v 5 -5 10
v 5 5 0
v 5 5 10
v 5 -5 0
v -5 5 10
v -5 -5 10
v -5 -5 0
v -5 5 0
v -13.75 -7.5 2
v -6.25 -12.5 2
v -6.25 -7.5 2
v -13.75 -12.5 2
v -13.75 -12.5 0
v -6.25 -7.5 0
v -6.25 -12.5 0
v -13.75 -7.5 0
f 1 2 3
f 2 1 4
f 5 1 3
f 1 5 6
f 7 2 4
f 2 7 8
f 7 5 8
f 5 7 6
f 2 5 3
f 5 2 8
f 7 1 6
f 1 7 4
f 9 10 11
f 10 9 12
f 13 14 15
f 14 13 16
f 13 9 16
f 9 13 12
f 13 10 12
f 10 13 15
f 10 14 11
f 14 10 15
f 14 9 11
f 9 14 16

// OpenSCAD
translate([0, 0, 5]) color([0,1,0,0.9]) cube([10, 10, 10], center=true);
translate([-13.5, -12.25, 1]) color([1,0,0]) cube([0.5, 0.5, 2], center=true);
translate([-13.0, -12.25, 1]) color([1,0,0]) cube([0.5, 0.5, 2], center=true);
translate([-12.5, -12.25, 1]) color([1,0,0]) cube([0.5, 0.5, 2], center=true);
translate([-12.0, -12.25, 1]) color([1,0,0]) cube([0.5, 0.5, 2], center=true);
translate([-11.5, -12.25, 1]) color([1,0,0]) cube([0.5, 0.5, 2], center=true);
translate([-11.0, -12.25, 1]) color([1,0,0]) cube([0.5, 0.5, 2], center=true);
translate([-10.5, -12.25, 1]) color([1,0,0]) cube([0.5, 0.5, 2], center=true);
translate([-10.0, -12.25, 1]) color([1,0,0]) cube([0.5, 0.5, 2], center=true);
translate([-9.5, -12.25, 1]) color([1,0,0]) cube([0.5, 0.5, 2], center=true);
translate([-9.0, -12.25, 1]) color([1,0,0]) cube([0.5, 0.5, 2], center=true);
translate([-8.5, -12.25, 1]) color([1,0,0]) cube([0.5, 0.5, 2], center=true);
translate([-8.0, -12.25, 1]) color([1,0,0]) cube([0.5, 0.5, 2], center=true);
translate([-7.5, -12.25, 1]) color([1,0,0]) cube([0.5, 0.5, 2], center=true);
translate([-7.0, -12.25, 1]) color([1,0,0]) cube([0.5, 0.5, 2], center=true);
translate([-6.5, -12.25, 1]) color([1,0,0]) cube([0.5, 0.5, 2], center=true);
translate([-13.5, -11.75, 1]) color([1,0,0]) cube([0.5, 0.5, 2], center=true);
translate([-13.0, -11.75, 1]) color([1,0,0]) cube([0.5, 0.5, 2], center=true);
translate([-12.5, -11.75, 1]) color([1,0,0]) cube([0.5, 0.5, 2], center=true);
translate([-12.0, -11.75, 1]) color([1,0,0]) cube([0.5, 0.5, 2], center=true);
translate([-11.5, -11.75, 1]) color([1,0,0]) cube([0.5, 0.5, 2], center=true);
translate([-11.0, -11.75, 1]) color([1,0,0]) cube([0.5, 0.5, 2], center=true);
translate([-10.5, -11.75, 1]) color([1,0,0]) cube([0.5, 0.5, 2], center=true);
translate([-10.0, -11.75, 1]) color([1,0,0]) cube([0.5, 0.5, 2], center=true);
translate([-9.5, -11.75, 1]) color([1,0,0]) cube([0.5, 0.5, 2], center=true);
translate([-9.0, -11.75, 1]) color([1,0,0]) cube([0.5, 0.5, 2], center=true);
translate([-8.5, -11.75, 1]) color([1,0,0]) cube([0.5, 0.5, 2], center=true);
translate([-8.0, -11.75, 1]) color([1,0,0]) cube([0.5, 0.5, 2], center=true);
translate([-7.5, -11.75, 1]) color([1,0,0]) cube([0.5, 0.5, 2], center=true);
translate([-7.0, -11.75, 1]) color([1,0,0]) cube([0.5, 0.5, 2], center=true);
translate([-6.5, -11.75, 1]) color([1,0,0]) cube([0.5, 0.5, 2], center=true);
translate([-13.5, -11.25, 1]) color([1,0,0]) cube([0.5, 0.5, 2], center=true);
translate([-13.0, -11.25, 1]) color([1,0,0]) cube([0.5, 0.5, 2], center=true);
translate([-12.5, -11.25, 1]) color([1,0,0]) cube([0.5, 0.5, 2], center=true);
translate([-12.0, -11.25, 1]) color([1,0,0]) cube([0.5, 0.5, 2], center=true);
translate([-11.5, -11.25, 1]) color([1,0,0]) cube([0.5, 0.5, 2], center=true);
translate([-11.0, -11.25, 1]) color([1,0,0]) cube([0.5, 0.5, 2], center=true);
translate([-10.5, -11.25, 1]) color([1,0,0]) cube([0.5, 0.5, 2], center=true);
translate([-10.0, -11.25, 1]) color([1,0,0]) cube([0.5, 0.5, 2], center=true);
translate([-9.5, -11.25, 1]) color([1,0,0]) cube([0.5, 0.5, 2], center=true);
translate([-9.0, -11.25, 1]) color([1,0,0]) cube([0.5, 0.5, 2], center=true);
translate([-8.5, -11.25, 1]) color([1,0,0]) cube([0.5, 0.5, 2], center=true);
translate([-8.0, -11.25, 1]) color([1,0,0]) cube([0.5, 0.5, 2], center=true);
translate([-7.5, -11.25, 1]) color([1,0,0]) cube([0.5, 0.5, 2], center=true);
translate([-7.0, -11.25, 1]) color([1,0,0]) cube([0.5, 0.5, 2], center=true);
translate([-6.5, -11.25, 1]) color([1,0,0]) cube([0.5, 0.5, 2], center=true);
translate([-13.5, -10.75, 1]) color([1,0,0]) cube([0.5, 0.5, 2], center=true);
translate([-13.0, -10.75, 1]) color([1,0,0]) cube([0.5, 0.5, 2], center=true);
translate([-12.5, -10.75, 1]) color([1,0,0]) cube([0.5, 0.5, 2], center=true);
translate([-12.0, -10.75, 1]) color([1,0,0]) cube([0.5, 0.5, 2], center=true);
translate([-11.5, -10.75, 1]) color([1,0,0]) cube([0.5, 0.5, 2], center=true);
translate([-11.0, -10.75, 1]) color([1,0,0]) cube([0.5, 0.5, 2], center=true);
translate([-10.5, -10.75, 1]) color([1,0,0]) cube([0.5, 0.5, 2], center=true);
translate([-10.0, -10.75, 1]) color([1,0,0]) cube([0.5, 0.5, 2], center=true);
translate([-9.5, -10.75, 1]) color([1,0,0]) cube([0.5, 0.5, 2], center=true);
translate([-9.0, -10.75, 1]) color([1,0,0]) cube([0.5, 0.5, 2], center=true);
translate([-8.5, -10.75, 1]) color([1,0,0]) cube([0.5, 0.5, 2], center=true);
translate([-8.0, -10.75, 1]) color([1,0,0]) cube([0.5, 0.5, 2], center=true);
translate([-7.5, -10.75, 1]) color([1,0,0]) cube([0.5, 0.5, 2], center=true);
translate([-7.0, -10.75, 1]) color([1,0,0]) cube([0.5, 0.5, 2], center=true);
translate([-6.5, -10.75, 1]) color([1,0,0]) cube([0.5, 0.5, 2], center=true);
translate([-13.5, -10.25, 1]) color([1,0,0]) cube([0.5, 0.5, 2], center=true);
translate([-13.0, -10.25, 1]) color([1,0,0]) cube([0.5, 0.5, 2], center=true);
translate([-12.5, -10.25, 1]) color([1,0,0]) cube([0.5, 0.5, 2], center=true);
translate([-12.0, -10.25, 1]) color([1,0,0]) cube([0.5, 0.5, 2], center=true);
translate([-11.5, -10.25, 1]) color([1,0,0]) cube([0.5, 0.5, 2], center=true);
translate([-11.0, -10.25, 1]) color([1,0,0]) cube([0.5, 0.5, 2], center=true);
translate([-10.5, -10.25, 1]) color([1,0,0]) cube([0.5, 0.5, 2], center=true);
translate([-10.0, -10.25, 1]) color([1,0,0]) cube([0.5, 0.5, 2], center=true);
translate([-9.5, -10.25, 1]) color([1,0,0]) cube([0.5, 0.5, 2], center=true);
translate([-9.0, -10.25, 1]) color([1,0,0]) cube([0.5, 0.5, 2], center=true);
translate([-8.5, -10.25, 1]) color([1,0,0]) cube([0.5, 0.5, 2], center=true);
translate([-8.0, -10.25, 1]) color([1,0,0]) cube([0.5, 0.5, 2], center=true);
translate([-7.5, -10.25, 1]) color([1,0,0]) cube([0.5, 0.5, 2], center=true);
translate([-7.0, -10.25, 1]) color([1,0,0]) cube([0.5, 0.5, 2], center=true);
translate([-6.5, -10.25, 1]) color([1,0,0]) cube([0.5, 0.5, 2], center=true);
translate([-13.5, -9.75, 1]) color([1,0,0]) cube([0.5, 0.5, 2], center=true);
translate([-13.0, -9.75, 1]) color([1,0,0]) cube([0.5, 0.5, 2], center=true);
translate([-12.5, -9.75, 1]) color([1,0,0]) cube([0.5, 0.5, 2], center=true);
translate([-12.0, -9.75, 1]) color([1,0,0]) cube([0.5, 0.5, 2], center=true);
translate([-11.5, -9.75, 1]) color([1,0,0]) cube([0.5, 0.5, 2], center=true);
translate([-11.0, -9.75, 1]) color([1,0,0]) cube([0.5, 0.5, 2], center=true);
translate([-10.5, -9.75, 1]) color([1,0,0]) cube([0.5, 0.5, 2], center=true);
translate([-10.0, -9.75, 1]) color([1,0,0]) cube([0.5, 0.5, 2], center=true);
translate([-9.5, -9.75, 1]) color([1,0,0]) cube([0.5, 0.5, 2], center=true);
translate([-9.0, -9.75, 1]) color([1,0,0]) cube([0.5, 0.5, 2], center=true);
translate([-8.5, -9.75, 1]) color([1,0,0]) cube([0.5, 0.5, 2], center=true);
translate([-8.0, -9.75, 1]) color([1,0,0]) cube([0.5, 0.5, 2], center=true);
translate([-7.5, -9.75, 1]) color([1,0,0]) cube([0.5, 0.5, 2], center=true);
translate([-7.0, -9.75, 1]) color([1,0,0]) cube([0.5, 0.5, 2], center=true);
translate([-6.5, -9.75, 1]) color([1,0,0]) cube([0.5, 0.5, 2], center=true);
translate([-13.5, -9.25, 1]) color([1,0,0]) cube([0.5, 0.5, 2], center=true);
translate([-13.0, -9.25, 1]) color([1,0,0]) cube([0.5, 0.5, 2], center=true);
translate([-12.5, -9.25, 1]) color([1,0,0]) cube([0.5, 0.5, 2], center=true);
translate([-12.0, -9.25, 1]) color([1,0,0]) cube([0.5, 0.5, 2], center=true);
translate([-11.5, -9.25, 1]) color([1,0,0]) cube([0.5, 0.5, 2], center=true);
translate([-11.0, -9.25, 1]) color([1,0,0]) cube([0.5, 0.5, 2], center=true);
translate([-10.5, -9.25, 1]) color([1,0,0]) cube([0.5, 0.5, 2], center=true);
translate([-10.0, -9.25, 1]) color([1,0,0]) cube([0.5, 0.5, 2], center=true);
translate([-9.5, -9.25, 1]) color([1,0,0]) cube([0.5, 0.5, 2], center=true);
translate([-9.0, -9.25, 1]) color([1,0,0]) cube([0.5, 0.5, 2], center=true);
translate([-8.5, -9.25, 1]) color([1,0,0]) cube([0.5, 0.5, 2], center=true);
translate([-8.0, -9.25, 1]) color([1,0,0]) cube([0.5, 0.5, 2], center=true);
translate([-7.5, -9.25, 1]) color([1,0,0]) cube([0.5, 0.5, 2], center=true);
translate([-7.0, -9.25, 1]) color([1,0,0]) cube([0.5, 0.5, 2], center=true);
translate([-6.5, -9.25, 1]) color([1,0,0]) cube([0.5, 0.5, 2], center=true);
translate([-13.5, -8.75, 1]) color([1,0,0]) cube([0.5, 0.5, 2], center=true);
translate([-13.0, -8.75, 1]) color([1,0,0]) cube([0.5, 0.5, 2], center=true);
translate([-12.5, -8.75, 1]) color([1,0,0]) cube([0.5, 0.5, 2], center=true);
translate([-12.0, -8.75, 1]) color([1,0,0]) cube([0.5, 0.5, 2], center=true);
translate([-11.5, -8.75, 1]) color([1,0,0]) cube([0.5, 0.5, 2], center=true);
translate([-11.0, -8.75, 1]) color([1,0,0]) cube([0.5, 0.5, 2], center=true);
translate([-10.5, -8.75, 1]) color([1,0,0]) cube([0.5, 0.5, 2], center=true);
translate([-10.0, -8.75, 1]) color([1,0,0]) cube([0.5, 0.5, 2], center=true);
translate([-9.5, -8.75, 1]) color([1,0,0]) cube([0.5, 0.5, 2], center=true);
translate([-9.0, -8.75, 1]) color([1,0,0]) cube([0.5, 0.5, 2], center=true);
translate([-8.5, -8.75, 1]) color([1,0,0]) cube([0.5, 0.5, 2], center=true);
translate([-8.0, -8.75, 1]) color([1,0,0]) cube([0.5, 0.5, 2], center=true);
translate([-7.5, -8.75, 1]) color([1,0,0]) cube([0.5, 0.5, 2], center=true);
translate([-7.0, -8.75, 1]) color([1,0,0]) cube([0.5, 0.5, 2], center=true);
translate([-6.5, -8.75, 1]) color([1,0,0]) cube([0.5, 0.5, 2], center=true);
translate([-13.5, -8.25, 1]) color([1,0,0]) cube([0.5, 0.5, 2], center=true);
translate([-13.0, -8.25, 1]) color([1,0,0]) cube([0.5, 0.5, 2], center=true);
translate([-12.5, -8.25, 1]) color([1,0,0]) cube([0.5, 0.5, 2], center=true);
translate([-12.0, -8.25, 1]) color([1,0,0]) cube([0.5, 0.5, 2], center=true);
translate([-11.5, -8.25, 1]) color([1,0,0]) cube([0.5, 0.5, 2], center=true);
translate([-11.0, -8.25, 1]) color([1,0,0]) cube([0.5, 0.5, 2], center=true);
translate([-10.5, -8.25, 1]) color([1,0,0]) cube([0.5, 0.5, 2], center=true);
translate([-10.0, -8.25, 1]) color([1,0,0]) cube([0.5, 0.5, 2], center=true);
translate([-9.5, -8.25, 1]) color([1,0,0]) cube([0.5, 0.5, 2], center=true);
translate([-9.0, -8.25, 1]) color([1,0,0]) cube([0.5, 0.5, 2], center=true);
translate([-8.5, -8.25, 1]) color([1,0,0]) cube([0.5, 0.5, 2], center=true);
translate([-8.0, -8.25, 1]) color([1,0,0]) cube([0.5, 0.5, 2], center=true);
translate([-7.5, -8.25, 1]) color([1,0,0]) cube([0.5, 0.5, 2], center=true);
translate([-7.0, -8.25, 1]) color([1,0,0]) cube([0.5, 0.5, 2], center=true);
translate([-6.5, -8.25, 1]) color([1,0,0]) cube([0.5, 0.5, 2], center=true);
translate([-13.5, -7.75, 1]) color([1,0,0]) cube([0.5, 0.5, 2], center=true);
translate([-13.0, -7.75, 1]) color([1,0,0]) cube([0.5, 0.5, 2], center=true);
translate([-12.5, -7.75, 1]) color([1,0,0]) cube([0.5, 0.5, 2], center=true);
translate([-12.0, -7.75, 1]) color([1,0,0]) cube([0.5, 0.5, 2], center=true);
translate([-11.5, -7.75, 1]) color([1,0,0]) cube([0.5, 0.5, 2], center=true);
translate([-11.0, -7.75, 1]) color([1,0,0]) cube([0.5, 0.5, 2], center=true);
translate([-10.5, -7.75, 1]) color([1,0,0]) cube([0.5, 0.5, 2], center=true);
translate([-10.0, -7.75, 1]) color([1,0,0]) cube([0.5, 0.5, 2], center=true);
translate([-9.5, -7.75, 1]) color([1,0,0]) cube([0.5, 0.5, 2], center=true);
translate([-9.0, -7.75, 1]) color([1,0,0]) cube([0.5, 0.5, 2], center=true);
translate([-8.5, -7.75, 1]) color([1,0,0]) cube([0.5, 0.5, 2], center=true);
translate([-8.0, -7.75, 1]) color([1,0,0]) cube([0.5, 0.5, 2], center=true);
translate([-7.5, -7.75, 1]) color([1,0,0]) cube([0.5, 0.5, 2], center=true);
translate([-7.0, -7.75, 1]) color([1,0,0]) cube([0.5, 0.5, 2], center=true);
translate([-6.5, -7.75, 1]) color([1,0,0]) cube([0.5, 0.5, 2], center=true);
